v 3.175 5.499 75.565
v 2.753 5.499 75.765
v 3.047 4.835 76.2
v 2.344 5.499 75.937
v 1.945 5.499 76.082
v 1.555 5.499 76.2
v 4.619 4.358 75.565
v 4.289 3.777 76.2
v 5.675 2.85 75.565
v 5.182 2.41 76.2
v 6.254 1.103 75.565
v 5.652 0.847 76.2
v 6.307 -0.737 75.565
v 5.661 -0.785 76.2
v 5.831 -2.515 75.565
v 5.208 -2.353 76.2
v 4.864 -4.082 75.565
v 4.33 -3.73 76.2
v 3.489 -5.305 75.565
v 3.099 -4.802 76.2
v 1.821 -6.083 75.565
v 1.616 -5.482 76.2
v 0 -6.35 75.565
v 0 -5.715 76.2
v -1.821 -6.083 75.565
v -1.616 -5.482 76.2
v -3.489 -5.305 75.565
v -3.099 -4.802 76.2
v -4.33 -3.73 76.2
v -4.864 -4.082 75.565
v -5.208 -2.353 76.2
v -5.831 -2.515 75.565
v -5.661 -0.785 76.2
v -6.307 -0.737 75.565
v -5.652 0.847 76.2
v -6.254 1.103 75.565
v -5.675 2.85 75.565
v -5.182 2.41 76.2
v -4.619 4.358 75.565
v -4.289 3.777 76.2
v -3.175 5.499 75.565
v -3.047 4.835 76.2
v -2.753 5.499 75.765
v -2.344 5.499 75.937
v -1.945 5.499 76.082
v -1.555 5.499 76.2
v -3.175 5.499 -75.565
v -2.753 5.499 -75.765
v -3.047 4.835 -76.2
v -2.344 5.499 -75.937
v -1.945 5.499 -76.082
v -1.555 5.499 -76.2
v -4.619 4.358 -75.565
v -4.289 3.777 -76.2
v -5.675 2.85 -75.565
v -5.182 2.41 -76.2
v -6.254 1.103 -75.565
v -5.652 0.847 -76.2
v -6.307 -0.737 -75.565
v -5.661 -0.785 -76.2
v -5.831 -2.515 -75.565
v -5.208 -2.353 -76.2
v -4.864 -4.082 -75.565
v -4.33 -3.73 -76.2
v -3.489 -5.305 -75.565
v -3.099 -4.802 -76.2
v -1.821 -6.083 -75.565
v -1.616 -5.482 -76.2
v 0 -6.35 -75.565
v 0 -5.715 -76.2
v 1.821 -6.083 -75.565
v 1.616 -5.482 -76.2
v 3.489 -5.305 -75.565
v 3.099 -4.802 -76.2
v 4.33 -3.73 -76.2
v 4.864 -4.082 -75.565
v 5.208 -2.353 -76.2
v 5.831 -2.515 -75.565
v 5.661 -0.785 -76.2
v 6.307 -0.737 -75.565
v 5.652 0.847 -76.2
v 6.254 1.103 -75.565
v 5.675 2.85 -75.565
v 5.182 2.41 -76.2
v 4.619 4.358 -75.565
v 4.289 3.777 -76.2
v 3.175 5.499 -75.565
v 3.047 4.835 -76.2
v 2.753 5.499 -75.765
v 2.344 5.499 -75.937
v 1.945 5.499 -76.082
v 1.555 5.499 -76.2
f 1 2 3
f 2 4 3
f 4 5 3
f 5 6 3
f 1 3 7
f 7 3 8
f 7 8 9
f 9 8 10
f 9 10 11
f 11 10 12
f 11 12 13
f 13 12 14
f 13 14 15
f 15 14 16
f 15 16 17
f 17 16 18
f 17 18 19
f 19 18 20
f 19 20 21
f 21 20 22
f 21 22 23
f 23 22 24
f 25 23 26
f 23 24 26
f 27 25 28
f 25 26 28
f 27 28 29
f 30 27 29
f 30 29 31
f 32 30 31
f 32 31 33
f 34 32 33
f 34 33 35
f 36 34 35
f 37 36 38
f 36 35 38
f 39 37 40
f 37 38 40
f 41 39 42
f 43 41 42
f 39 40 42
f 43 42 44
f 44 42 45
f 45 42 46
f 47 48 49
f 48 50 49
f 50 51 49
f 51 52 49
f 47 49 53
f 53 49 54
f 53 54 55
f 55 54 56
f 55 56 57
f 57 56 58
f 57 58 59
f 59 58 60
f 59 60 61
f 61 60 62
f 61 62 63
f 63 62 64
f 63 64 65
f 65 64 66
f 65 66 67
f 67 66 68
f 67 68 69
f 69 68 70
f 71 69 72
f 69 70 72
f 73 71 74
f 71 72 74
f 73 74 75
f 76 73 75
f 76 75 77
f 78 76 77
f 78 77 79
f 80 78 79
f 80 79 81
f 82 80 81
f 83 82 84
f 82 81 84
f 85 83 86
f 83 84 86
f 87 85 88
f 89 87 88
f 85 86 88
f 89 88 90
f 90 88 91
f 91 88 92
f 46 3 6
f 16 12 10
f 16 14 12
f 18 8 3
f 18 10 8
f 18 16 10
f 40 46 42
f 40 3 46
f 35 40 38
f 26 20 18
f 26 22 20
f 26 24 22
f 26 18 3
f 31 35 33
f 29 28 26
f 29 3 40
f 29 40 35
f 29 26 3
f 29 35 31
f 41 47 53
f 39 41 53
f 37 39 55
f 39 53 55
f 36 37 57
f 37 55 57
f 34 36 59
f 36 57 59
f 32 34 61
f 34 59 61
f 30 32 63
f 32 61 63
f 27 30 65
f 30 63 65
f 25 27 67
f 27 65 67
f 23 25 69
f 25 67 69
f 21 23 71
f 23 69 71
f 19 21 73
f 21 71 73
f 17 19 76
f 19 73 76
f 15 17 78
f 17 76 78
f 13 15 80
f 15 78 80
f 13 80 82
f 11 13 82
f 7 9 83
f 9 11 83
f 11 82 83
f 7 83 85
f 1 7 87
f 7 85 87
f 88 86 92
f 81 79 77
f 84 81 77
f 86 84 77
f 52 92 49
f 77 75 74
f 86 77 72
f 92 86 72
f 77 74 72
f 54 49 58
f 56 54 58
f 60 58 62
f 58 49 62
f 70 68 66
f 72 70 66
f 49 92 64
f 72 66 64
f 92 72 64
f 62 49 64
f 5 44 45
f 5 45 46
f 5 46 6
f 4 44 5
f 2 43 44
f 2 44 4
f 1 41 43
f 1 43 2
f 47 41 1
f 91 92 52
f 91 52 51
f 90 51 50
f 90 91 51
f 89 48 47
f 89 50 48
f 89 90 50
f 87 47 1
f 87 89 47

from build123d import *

# Parameters (mm, degrees)
BOSS_EXTRUDE2_DEPTH      = 76.2
BOSS_EXTRUDE2_DEPTH_BACK = 76.2
SKETCH3_R                = 6.35
CUT_EXTRUDE5_DEPTH       = 77.727341932
CUT_EXTRUDE5_DEPTH_BACK  = 77.727341932
CHAMFER1_SIZE            = 0.635


with BuildPart() as part:
    # Sketch3 → Boss-Extrude2 (new, two sides: drawn at the far end of the back side and taken through both)
    with BuildSketch(Plane.XY.offset(-BOSS_EXTRUDE2_DEPTH_BACK)):
        with Locations(Location((0, 0, 0), (0, 0, 180))):
            Circle(SKETCH3_R)
    extrude(amount=BOSS_EXTRUDE2_DEPTH + BOSS_EXTRUDE2_DEPTH_BACK)

    # Sketch10 → Cut-Extrude5 (cut, two sides: drawn at the far end of the back side and taken through both)
    with BuildSketch(Plane.XY.offset(-CUT_EXTRUDE5_DEPTH_BACK)):
        with BuildLine():
            Line((-3.175, 5.499261314), (3.175, 5.499261314))
            ThreePointArc((3.175, 5.499261314), (0, 6.35), (-3.175, 5.499261314))
        make_face()
    extrude(amount=CUT_EXTRUDE5_DEPTH + CUT_EXTRUDE5_DEPTH_BACK, mode=Mode.SUBTRACT)

    # Chamfer1
    chamfer1_edges = [part.edges().sort_by_distance(p)[0] for p in [
        (0, -6.35, -76.2),
        (0, -6.35, 76.2),
    ]]
    chamfer(chamfer1_edges, length=CHAMFER1_SIZE)


solid = part.part
